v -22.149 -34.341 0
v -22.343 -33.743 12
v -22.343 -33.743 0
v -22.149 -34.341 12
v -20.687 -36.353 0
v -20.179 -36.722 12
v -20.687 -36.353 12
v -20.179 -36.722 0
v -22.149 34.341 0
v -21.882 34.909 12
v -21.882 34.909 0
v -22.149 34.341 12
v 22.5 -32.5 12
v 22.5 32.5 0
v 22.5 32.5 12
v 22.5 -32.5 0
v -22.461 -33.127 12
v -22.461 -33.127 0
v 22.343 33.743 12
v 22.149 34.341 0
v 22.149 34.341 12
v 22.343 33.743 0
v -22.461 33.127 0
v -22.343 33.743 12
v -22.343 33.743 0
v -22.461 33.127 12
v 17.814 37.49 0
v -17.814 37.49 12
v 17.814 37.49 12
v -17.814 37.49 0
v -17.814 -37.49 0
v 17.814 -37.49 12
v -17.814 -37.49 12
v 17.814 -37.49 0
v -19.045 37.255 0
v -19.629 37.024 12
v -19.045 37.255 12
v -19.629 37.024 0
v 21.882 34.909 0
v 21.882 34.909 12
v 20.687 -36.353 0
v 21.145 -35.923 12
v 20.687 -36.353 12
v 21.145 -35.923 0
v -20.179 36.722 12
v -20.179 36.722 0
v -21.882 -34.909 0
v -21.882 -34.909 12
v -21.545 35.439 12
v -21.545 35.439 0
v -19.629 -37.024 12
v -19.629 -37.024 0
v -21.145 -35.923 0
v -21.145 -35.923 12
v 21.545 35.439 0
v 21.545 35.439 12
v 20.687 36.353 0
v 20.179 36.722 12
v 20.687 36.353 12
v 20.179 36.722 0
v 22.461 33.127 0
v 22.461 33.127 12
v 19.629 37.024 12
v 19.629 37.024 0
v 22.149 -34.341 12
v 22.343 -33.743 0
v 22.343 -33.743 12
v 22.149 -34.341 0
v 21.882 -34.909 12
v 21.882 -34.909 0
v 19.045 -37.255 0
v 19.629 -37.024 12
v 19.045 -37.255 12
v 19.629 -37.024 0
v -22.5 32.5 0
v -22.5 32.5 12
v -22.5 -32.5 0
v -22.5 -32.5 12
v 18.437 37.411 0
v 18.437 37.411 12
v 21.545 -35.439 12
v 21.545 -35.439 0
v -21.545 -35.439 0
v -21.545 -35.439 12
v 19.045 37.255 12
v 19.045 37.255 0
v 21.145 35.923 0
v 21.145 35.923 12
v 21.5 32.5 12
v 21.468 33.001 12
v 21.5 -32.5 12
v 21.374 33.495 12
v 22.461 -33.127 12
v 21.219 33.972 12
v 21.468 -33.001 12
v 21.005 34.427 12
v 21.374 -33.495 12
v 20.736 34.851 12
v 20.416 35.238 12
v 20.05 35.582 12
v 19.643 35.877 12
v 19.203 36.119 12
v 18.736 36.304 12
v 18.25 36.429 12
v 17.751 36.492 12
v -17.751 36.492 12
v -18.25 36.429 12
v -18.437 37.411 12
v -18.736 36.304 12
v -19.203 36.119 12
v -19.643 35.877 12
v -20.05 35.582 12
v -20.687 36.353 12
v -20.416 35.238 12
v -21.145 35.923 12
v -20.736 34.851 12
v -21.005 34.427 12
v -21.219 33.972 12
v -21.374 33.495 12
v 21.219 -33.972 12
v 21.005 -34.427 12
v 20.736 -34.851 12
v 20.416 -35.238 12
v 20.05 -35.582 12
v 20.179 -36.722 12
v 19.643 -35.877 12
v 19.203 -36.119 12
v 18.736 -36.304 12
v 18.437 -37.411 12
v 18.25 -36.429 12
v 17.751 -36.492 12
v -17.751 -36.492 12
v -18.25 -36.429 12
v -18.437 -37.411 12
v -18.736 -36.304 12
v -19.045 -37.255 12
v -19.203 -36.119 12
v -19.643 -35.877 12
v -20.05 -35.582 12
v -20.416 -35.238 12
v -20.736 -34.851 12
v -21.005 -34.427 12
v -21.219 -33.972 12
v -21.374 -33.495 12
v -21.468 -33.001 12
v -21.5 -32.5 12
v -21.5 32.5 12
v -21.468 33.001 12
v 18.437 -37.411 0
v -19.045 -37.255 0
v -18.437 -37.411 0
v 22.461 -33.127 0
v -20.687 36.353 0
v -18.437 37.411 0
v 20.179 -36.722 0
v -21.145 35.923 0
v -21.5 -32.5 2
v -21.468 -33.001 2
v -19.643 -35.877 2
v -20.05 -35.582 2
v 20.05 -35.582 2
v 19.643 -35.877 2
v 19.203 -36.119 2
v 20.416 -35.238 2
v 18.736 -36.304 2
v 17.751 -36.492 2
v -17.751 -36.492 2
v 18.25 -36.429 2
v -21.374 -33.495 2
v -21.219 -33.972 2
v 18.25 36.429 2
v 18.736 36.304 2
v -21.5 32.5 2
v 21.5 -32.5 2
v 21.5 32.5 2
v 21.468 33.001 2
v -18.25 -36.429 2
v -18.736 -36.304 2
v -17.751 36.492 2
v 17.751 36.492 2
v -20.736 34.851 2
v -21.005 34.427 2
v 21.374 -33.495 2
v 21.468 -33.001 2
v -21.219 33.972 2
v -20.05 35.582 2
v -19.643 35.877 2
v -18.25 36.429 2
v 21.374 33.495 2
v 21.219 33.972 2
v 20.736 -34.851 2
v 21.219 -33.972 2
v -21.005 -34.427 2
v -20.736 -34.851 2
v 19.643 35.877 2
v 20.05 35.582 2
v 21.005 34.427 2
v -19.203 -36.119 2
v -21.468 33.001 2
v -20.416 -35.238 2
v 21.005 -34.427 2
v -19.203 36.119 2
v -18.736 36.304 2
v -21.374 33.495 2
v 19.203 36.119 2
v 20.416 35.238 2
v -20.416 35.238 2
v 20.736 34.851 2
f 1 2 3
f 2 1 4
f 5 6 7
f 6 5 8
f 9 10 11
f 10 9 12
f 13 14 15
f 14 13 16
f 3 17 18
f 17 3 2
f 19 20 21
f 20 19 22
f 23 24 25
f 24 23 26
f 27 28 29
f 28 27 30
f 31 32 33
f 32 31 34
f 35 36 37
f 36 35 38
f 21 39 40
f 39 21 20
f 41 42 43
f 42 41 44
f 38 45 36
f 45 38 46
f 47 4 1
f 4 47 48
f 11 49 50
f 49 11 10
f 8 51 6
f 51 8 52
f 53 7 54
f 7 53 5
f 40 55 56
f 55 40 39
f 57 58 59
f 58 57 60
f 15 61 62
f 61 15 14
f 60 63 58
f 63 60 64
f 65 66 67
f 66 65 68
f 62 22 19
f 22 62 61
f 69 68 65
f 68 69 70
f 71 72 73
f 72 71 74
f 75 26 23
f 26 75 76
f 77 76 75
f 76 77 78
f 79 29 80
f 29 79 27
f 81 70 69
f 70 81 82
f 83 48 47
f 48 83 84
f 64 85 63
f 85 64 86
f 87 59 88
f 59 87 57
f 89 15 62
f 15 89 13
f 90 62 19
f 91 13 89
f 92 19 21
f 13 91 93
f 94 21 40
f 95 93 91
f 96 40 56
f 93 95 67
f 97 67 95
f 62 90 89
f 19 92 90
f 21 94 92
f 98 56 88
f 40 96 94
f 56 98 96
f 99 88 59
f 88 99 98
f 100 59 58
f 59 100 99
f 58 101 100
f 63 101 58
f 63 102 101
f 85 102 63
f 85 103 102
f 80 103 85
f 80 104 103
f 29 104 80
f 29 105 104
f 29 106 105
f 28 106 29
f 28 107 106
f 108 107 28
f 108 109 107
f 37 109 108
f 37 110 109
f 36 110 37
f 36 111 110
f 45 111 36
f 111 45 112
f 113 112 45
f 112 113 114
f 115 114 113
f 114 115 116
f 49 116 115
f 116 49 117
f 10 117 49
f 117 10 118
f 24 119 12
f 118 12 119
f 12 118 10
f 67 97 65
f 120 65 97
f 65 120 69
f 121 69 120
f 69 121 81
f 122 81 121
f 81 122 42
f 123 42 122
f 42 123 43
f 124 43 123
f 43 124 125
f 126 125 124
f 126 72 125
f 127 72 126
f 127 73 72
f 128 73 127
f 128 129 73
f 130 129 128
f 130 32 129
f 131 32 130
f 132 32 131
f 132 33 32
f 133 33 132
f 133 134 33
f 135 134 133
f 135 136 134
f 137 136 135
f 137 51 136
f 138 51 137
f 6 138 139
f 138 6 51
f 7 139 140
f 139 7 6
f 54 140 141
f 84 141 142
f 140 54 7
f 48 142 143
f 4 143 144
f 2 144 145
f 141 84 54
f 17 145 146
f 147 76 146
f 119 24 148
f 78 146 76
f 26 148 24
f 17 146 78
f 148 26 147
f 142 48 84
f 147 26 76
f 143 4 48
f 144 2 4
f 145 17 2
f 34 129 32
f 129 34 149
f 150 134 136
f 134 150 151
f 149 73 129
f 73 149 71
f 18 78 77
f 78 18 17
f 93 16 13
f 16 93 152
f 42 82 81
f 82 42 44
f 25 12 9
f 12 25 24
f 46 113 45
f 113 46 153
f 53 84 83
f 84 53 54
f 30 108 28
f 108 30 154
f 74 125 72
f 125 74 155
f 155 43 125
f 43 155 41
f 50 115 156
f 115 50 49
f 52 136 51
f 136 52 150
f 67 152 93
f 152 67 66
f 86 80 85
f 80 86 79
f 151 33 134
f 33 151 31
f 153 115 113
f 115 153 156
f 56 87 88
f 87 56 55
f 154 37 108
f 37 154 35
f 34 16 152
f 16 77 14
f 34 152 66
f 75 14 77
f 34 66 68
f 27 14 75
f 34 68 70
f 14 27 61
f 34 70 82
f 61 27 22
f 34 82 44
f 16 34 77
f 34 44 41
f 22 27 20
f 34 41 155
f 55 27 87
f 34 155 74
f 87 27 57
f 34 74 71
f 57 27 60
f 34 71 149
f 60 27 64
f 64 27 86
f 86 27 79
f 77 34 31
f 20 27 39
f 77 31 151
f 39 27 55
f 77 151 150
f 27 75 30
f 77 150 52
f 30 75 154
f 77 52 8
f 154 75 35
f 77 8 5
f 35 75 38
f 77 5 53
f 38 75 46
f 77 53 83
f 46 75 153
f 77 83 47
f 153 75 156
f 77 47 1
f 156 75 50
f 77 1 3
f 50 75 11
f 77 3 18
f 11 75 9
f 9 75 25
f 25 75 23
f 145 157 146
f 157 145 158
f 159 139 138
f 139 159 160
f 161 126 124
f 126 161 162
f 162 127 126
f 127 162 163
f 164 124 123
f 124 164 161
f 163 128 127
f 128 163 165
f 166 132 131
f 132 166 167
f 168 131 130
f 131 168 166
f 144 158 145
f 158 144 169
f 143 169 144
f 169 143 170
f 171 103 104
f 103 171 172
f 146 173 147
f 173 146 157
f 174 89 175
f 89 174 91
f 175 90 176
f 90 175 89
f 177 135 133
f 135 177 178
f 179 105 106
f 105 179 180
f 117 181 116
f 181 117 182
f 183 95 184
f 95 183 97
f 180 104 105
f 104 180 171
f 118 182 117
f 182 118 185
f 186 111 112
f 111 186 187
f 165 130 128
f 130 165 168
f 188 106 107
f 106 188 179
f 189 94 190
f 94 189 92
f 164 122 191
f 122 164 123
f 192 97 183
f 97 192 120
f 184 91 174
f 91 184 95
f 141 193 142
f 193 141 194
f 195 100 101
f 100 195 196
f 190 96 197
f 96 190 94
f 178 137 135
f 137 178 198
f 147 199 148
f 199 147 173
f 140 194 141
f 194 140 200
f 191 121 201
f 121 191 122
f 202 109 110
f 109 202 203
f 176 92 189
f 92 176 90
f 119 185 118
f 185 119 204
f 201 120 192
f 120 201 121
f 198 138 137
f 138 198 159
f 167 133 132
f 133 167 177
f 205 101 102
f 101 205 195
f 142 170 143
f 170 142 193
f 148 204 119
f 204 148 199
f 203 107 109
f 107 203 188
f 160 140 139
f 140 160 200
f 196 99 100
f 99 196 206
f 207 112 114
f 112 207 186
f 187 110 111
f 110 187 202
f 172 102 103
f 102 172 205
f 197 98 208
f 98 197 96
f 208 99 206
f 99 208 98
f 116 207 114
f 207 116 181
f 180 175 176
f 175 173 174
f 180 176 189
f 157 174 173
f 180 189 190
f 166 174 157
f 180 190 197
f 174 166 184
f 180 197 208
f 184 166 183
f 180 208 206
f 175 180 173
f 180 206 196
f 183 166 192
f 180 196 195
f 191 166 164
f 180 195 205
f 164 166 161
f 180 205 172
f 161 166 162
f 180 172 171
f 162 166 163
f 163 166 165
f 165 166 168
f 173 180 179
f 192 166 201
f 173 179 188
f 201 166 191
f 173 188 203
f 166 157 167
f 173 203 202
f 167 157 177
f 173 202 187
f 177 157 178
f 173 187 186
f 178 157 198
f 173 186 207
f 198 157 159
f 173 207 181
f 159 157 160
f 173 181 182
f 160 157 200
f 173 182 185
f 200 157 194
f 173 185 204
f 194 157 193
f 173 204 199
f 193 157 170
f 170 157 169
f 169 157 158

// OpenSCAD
$fn = 50;


difference() {
	union() {
		hull() {
			translate(v = [-17.5000000000, 32.5000000000, 0]) {
				cylinder(h = 12, r = 5);
			}
			translate(v = [17.5000000000, 32.5000000000, 0]) {
				cylinder(h = 12, r = 5);
			}
			translate(v = [-17.5000000000, -32.5000000000, 0]) {
				cylinder(h = 12, r = 5);
			}
			translate(v = [17.5000000000, -32.5000000000, 0]) {
				cylinder(h = 12, r = 5);
			}
		}
	}
	union() {
		translate(v = [0, 0, 2]) {
			hull() {
				translate(v = [-17.5000000000, 32.5000000000, 0]) {
					cylinder(h = 10, r = 4);
				}
				translate(v = [17.5000000000, 32.5000000000, 0]) {
					cylinder(h = 10, r = 4);
				}
				translate(v = [-17.5000000000, -32.5000000000, 0]) {
					cylinder(h = 10, r = 4);
				}
				translate(v = [17.5000000000, -32.5000000000, 0]) {
					cylinder(h = 10, r = 4);
				}
			}
		}
	}
}
